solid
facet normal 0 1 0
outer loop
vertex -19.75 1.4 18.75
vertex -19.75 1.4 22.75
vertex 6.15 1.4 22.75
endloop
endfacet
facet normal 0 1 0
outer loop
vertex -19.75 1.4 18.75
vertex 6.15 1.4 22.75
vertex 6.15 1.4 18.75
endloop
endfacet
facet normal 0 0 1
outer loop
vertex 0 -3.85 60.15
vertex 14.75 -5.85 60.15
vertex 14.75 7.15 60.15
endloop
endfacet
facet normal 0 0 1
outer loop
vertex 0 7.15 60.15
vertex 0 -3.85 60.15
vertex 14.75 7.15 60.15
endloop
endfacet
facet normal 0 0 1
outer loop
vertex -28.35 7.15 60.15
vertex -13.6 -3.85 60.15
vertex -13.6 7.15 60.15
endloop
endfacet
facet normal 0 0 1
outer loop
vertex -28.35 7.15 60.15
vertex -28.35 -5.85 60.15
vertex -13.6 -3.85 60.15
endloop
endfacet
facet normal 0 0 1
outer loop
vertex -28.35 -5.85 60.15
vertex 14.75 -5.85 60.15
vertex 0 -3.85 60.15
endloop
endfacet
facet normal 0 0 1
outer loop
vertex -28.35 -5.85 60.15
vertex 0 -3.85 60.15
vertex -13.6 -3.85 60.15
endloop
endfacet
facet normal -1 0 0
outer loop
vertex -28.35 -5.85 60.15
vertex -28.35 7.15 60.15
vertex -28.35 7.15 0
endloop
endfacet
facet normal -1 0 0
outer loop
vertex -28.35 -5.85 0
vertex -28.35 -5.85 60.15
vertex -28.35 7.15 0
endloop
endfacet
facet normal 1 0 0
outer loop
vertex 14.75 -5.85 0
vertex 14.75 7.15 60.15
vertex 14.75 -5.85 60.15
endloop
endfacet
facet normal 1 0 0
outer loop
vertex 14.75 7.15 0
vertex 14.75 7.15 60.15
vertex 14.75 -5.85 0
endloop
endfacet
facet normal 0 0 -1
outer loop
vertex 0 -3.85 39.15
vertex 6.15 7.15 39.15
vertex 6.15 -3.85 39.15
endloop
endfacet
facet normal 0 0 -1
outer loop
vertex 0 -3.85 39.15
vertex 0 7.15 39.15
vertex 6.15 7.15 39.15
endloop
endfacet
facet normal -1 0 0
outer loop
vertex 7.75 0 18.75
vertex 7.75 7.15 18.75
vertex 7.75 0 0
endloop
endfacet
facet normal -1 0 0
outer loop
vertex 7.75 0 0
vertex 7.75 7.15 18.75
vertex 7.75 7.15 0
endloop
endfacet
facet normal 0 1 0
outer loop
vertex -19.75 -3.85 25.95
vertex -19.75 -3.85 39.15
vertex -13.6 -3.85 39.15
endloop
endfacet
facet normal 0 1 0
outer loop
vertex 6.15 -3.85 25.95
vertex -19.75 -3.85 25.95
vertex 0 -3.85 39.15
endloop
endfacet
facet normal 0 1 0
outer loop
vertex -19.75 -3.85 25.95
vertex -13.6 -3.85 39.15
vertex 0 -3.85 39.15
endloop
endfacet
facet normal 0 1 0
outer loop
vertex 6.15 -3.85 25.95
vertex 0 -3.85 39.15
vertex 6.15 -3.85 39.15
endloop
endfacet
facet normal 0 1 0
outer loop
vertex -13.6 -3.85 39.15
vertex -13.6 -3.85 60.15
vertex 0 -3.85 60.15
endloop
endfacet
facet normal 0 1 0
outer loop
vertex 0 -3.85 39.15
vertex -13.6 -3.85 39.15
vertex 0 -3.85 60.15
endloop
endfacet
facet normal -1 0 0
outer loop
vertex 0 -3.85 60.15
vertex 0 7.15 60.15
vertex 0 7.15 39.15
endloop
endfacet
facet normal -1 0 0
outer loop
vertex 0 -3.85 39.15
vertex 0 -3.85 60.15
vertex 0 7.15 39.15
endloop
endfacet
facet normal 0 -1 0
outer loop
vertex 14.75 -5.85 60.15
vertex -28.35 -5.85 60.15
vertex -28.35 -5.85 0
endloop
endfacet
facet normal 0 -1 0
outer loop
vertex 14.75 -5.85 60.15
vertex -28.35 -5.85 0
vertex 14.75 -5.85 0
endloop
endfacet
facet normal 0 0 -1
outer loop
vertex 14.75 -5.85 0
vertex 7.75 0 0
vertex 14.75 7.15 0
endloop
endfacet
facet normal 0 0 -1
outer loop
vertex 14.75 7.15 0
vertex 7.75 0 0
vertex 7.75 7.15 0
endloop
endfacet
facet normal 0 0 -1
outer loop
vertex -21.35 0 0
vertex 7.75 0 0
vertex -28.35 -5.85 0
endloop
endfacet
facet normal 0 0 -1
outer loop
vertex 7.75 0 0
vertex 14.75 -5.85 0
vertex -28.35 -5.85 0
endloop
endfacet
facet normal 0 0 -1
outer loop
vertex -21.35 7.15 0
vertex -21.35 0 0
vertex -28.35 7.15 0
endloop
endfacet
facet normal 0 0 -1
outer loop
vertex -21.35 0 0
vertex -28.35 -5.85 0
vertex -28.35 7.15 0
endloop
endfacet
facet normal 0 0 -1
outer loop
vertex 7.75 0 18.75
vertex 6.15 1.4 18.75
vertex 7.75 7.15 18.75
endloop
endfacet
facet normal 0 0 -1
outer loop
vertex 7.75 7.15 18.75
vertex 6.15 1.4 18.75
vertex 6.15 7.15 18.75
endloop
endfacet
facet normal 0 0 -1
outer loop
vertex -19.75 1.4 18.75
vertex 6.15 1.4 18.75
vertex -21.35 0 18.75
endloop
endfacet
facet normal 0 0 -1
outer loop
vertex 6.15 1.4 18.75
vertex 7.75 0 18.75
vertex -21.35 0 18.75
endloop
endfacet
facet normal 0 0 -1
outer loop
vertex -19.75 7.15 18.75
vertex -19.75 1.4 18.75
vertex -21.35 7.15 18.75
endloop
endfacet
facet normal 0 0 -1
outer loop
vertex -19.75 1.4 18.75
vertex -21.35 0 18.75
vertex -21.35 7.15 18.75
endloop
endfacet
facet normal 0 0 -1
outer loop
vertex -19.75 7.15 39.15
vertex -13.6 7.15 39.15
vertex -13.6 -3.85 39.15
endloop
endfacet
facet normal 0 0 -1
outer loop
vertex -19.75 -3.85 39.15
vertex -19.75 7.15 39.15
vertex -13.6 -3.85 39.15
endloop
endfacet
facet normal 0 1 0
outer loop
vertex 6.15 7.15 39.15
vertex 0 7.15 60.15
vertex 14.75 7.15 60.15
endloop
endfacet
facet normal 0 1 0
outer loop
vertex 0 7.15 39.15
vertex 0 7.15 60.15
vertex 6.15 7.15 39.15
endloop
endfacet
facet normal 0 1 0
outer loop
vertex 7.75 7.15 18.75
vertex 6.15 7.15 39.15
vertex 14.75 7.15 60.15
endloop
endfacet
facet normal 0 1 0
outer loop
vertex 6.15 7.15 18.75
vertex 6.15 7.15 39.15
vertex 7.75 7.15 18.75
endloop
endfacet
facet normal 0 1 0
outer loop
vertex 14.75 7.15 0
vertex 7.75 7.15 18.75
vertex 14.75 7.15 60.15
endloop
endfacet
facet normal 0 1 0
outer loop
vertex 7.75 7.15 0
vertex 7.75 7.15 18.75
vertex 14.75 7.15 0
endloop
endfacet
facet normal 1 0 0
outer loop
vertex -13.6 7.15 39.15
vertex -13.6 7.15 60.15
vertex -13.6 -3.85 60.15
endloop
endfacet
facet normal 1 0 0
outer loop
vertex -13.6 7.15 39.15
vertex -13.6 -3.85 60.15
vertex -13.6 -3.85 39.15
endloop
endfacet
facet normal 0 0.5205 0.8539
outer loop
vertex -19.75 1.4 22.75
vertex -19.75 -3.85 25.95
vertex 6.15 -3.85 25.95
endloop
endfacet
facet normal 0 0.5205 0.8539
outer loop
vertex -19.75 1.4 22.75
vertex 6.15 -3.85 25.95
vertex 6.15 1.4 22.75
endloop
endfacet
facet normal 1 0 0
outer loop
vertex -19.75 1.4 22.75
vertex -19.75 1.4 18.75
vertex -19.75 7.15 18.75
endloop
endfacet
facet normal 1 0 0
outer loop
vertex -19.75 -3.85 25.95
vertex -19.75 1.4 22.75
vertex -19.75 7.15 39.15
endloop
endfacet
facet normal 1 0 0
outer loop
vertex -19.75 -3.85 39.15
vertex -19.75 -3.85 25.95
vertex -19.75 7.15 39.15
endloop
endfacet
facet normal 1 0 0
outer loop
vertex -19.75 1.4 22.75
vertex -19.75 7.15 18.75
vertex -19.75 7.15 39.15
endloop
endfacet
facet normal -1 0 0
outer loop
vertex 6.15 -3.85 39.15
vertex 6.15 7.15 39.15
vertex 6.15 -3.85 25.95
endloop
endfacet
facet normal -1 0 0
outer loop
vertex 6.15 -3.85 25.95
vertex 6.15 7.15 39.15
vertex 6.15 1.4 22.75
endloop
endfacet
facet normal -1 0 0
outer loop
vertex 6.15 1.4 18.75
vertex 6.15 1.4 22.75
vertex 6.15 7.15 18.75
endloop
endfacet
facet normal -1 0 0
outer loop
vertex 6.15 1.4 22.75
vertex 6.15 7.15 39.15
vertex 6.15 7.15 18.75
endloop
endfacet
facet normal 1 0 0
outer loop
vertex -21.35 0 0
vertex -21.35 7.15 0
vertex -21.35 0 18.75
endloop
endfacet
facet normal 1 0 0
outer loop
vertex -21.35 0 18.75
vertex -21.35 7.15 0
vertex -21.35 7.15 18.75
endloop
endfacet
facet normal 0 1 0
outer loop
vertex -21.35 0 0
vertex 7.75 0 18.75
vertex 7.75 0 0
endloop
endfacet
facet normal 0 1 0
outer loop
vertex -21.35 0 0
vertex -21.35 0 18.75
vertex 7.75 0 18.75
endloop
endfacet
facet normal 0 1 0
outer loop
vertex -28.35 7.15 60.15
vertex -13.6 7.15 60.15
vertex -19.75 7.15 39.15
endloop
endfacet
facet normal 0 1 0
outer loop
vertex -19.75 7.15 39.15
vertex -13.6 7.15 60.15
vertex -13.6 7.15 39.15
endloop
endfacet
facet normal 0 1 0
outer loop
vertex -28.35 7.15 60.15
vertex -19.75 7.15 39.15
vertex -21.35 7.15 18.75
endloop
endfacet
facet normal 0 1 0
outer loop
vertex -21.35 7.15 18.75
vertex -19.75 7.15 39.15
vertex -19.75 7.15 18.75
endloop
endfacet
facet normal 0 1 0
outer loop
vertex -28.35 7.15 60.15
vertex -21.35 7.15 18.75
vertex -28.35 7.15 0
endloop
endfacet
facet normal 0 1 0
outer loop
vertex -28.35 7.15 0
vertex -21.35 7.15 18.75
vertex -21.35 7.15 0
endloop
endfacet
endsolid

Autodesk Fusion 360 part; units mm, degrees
sketch "Sketch1" plane through (0, 0, 0) normal (1, 0, 0) x (0, 0, -1)
  line L0 (0, 0) -> (-18.75, 0)
  line L1 (-18.75, 0) -> (-18.75, 20.75)
  line L2 (-18.75, 20.75) -> (0, 20.75)
  line L3 (0, 20.75) -> (0, 0)
  line L4 (-18.75, 20.75) -> (-18.75, 19)
  line L5 (-18.75, 0) -> (-18.75, 1.4)
  line L6 (-18.75, 19) -> (-22.75, 19)
  line L7 (-22.75, 19) -> (-22.75, 1.4)
  line L8 (-22.75, 1.4) -> (-18.75, 1.4)
  line L9 (-18.75, 1.4) -> (-18.75, 19)
  line L10 (-22.75, 19) -> (-22.75, 23.35)
  line L11 (-22.75, 1.4) -> (-22.75, -3.85)
  line L12 (-22.75, 23.35) -> (-60.15, 23.35)
  line L13 (-60.15, 23.35) -> (-60.15, -3.85)
  line L14 (-60.15, -3.85) -> (-22.75, -3.85)
  line L15 (-22.75, -3.85) -> (-22.75, 23.35)
  dimension "d1" = 18.75
  dimension "d2" = 20.75
  dimension "d4" = 1.75
  dimension "d6" = 4
  dimension "d7" = 4.35
  dimension "d9" = 37.4
sketch "Sketch3" plane through (0, 0, 0) normal (1, 0, 0) x (0, 0, -1)
  line L0 (-60.15, -3.85) -> (-60.15, 7.15)
  line L1 (-60.15, 7.15) -> (-39.15, 7.15)
  line L2 (-60.15, -3.85) -> (-22.75, -3.85)
  line L3 (-39.15, 7.15) -> (-39.15, -3.85)
  point P0 (-60.15, -3.85)
  dimension "d10" = 11
  dimension "d11" = 21
extrude "Extrude1" add sketch "Sketch3" along normal blind 6.15 makes body 1
sketch "Sketch4" plane through (6.15, 0, 0) normal (1, 0, 0) x (0, 0, -1)
  line L0 (-60.15, -3.85) -> (-39.15, -3.85)
  line L1 (-39.15, -3.85) -> (-39.15, 7.15)
  line L2 (-39.15, 7.15) -> (-60.15, 7.15)
  line L3 (-60.15, 7.15) -> (-60.15, -3.85)
  line L4 (-60.15, -3.85) -> (-18.75, -3.85)
  line L5 (-18.75, -3.85) -> (-18.75, 7.15)
  line L6 (-18.75, 7.15) -> (-60.15, 7.15)
  line L7 (-60.15, 7.15) -> (-60.15, -3.85)
  line L8 (-18.75, 1.4) -> (-18.75, 19)
extrude "Extrude2" add sketch "Sketch4" along normal blind 1.6 bodies 1
sketch "Sketch5" plane through (7.75, 0, 0) normal (1, 0, 0) x (0, 0, -1)
  line L0 (-18.75, -3.85) -> (-18.75, 7.15)
  line L1 (-18.75, 7.15) -> (-60.15, 7.15)
  line L2 (-60.15, 7.15) -> (-60.15, -3.85)
  line L3 (-60.15, -3.85) -> (-18.75, -3.85)
  line L4 (-60.15, -3.85) -> (0, -3.85)
  line L5 (0, -3.85) -> (0, 7.15)
  line L6 (0, 7.15) -> (-60.15, 7.15)
  line L7 (-60.15, 7.15) -> (-60.15, -3.85)
  line L8 (0, 20.75) -> (0, 0)
extrude "Extrude3" add sketch "Sketch5" along normal blind 7 bodies 1
sketch "Sketch6" plane through (0, 0, 60.15) normal (0, 0, 1) x (1, 0, 0)
  line L0 (0, 7.15) -> (0, -3.85)
  line L1 (0, -3.85) -> (14.75, -3.85)
  line L2 (14.75, -3.85) -> (14.75, 7.15)
  line L3 (14.75, 7.15) -> (0, 7.15)
  line L4 (0, -3.85) -> (-13.6, -3.85)
  dimension "d18" = 13.6
extrude "Extrude4" add sketch "Sketch3" along normal blind -14 and the other way blind 13.6 separate body makes body 2
extrude "Extrude5" add 1 faces at (-14, -0.1833, 46.15) along direction (-1, 0, 0) blind 6.15 on bodies 2 bodies 2
extrude "Extrude6" cut 1 faces at (-20.15, -0.1833, 46.15) along direction (1, 0, 0) blind 0.4 on bodies 2 bodies 2
sketch "Sketch7" plane through (-19.75, 0, 0) normal (-1, 0, 0) x (0, 0, 1)
  line L0 (39.15, -3.85) -> (60.15, -3.85)
  line L1 (60.15, -3.85) -> (60.15, 7.15)
  line L2 (60.15, 7.15) -> (39.15, 7.15)
  line L3 (39.15, 7.15) -> (39.15, -3.85)
  line L4 (60.15, 7.15) -> (18.75, 7.15)
  line L5 (18.75, 7.15) -> (18.75, -3.85)
  line L6 (18.75, -3.85) -> (60.15, -3.85)
  line L7 (60.15, -3.85) -> (60.15, 7.15)
  point P0 (18.75, -3.85)
extrude "Extrude7" add sketch "Sketch7" along normal blind 1.6 bodies 2
sketch "Sketch8" plane through (-21.35, 0, 0) normal (-1, 0, 0) x (0, 0, 1)
  line L0 (60.15, -3.85) -> (60.15, 7.15)
  line L1 (60.15, 7.15) -> (18.75, 7.15)
  line L2 (18.75, 7.15) -> (18.75, -3.85)
  line L3 (18.75, -3.85) -> (60.15, -3.85)
  line L4 (60.15, 7.15) -> (0, 7.15)
  line L5 (0, 7.15) -> (0, -3.85)
  line L6 (0, -3.85) -> (60.15, -3.85)
  line L7 (60.15, -3.85) -> (60.15, 7.15)
  point P0 (0, -3.85)
extrude "Extrude8" add sketch "Sketch8" along normal blind 7 bodies 2
sketch "Sketch9" plane through (0, 0, 0) normal (1, 0, 0) x (0, 0, -1)
  line L0 (-60.15, -3.85) -> (-25.95, -3.85)
  line L1 (-25.95, -3.85) -> (-22.75, 1.4)
  line L2 (-22.75, 1.4) -> (-18.75, 1.4)
  line L3 (-18.75, 1.4) -> (-18.75, 0)
  line L4 (-18.75, 0) -> (0, 0)
  line L5 (-25.95, -3.85) -> (0, -3.85)
  line L6 (0, -3.85) -> (0, 0)
  point P0 (-60.15, -3.85)
  point P1 (-22.75, 1.4)
  point P2 (-18.75, 1.4)
  point P3 (-18.75, 0)
  dimension "d31" = 34.2
extrude "Extrude9" add sketch "Sketch9" along normal blind 8 and the other way blind 24 bodies 1 2
sketch "Sketch10" plane through (0, -3.85, 0) normal (0, -1, 0) x (1, 0, 0)
  line L0 (-19.75, 25.95) -> (-19.75, 39.15)
  line L1 (-19.75, 39.15) -> (-13.6, 39.15)
  line L2 (-13.6, 39.15) -> (-13.6, 60.15)
  line L3 (-13.6, 60.15) -> (-28.35, 60.15)
  line L4 (-28.35, 60.15) -> (-28.35, 0)
  line L5 (-28.35, 0) -> (14.75, 0)
  line L6 (14.75, 0) -> (14.75, 60.15)
  line L7 (14.75, 60.15) -> (0, 60.15)
  line L8 (0, 60.15) -> (0, 39.15)
  line L9 (0, 39.15) -> (6.15, 39.15)
  line L10 (6.15, 39.15) -> (6.15, 25.95)
  line L11 (6.15, 25.95) -> (-19.75, 25.95)
  line L12 (-28.35, 60.15) -> (14.75, 60.15)
  line L13 (14.75, 60.15) -> (14.75, 0)
  line L14 (14.75, 0) -> (-28.35, 0)
  line L15 (-28.35, 0) -> (-28.35, 60.15)
extrude "Extrude10" add sketch "Sketch10" along normal blind 2 bodies 1
